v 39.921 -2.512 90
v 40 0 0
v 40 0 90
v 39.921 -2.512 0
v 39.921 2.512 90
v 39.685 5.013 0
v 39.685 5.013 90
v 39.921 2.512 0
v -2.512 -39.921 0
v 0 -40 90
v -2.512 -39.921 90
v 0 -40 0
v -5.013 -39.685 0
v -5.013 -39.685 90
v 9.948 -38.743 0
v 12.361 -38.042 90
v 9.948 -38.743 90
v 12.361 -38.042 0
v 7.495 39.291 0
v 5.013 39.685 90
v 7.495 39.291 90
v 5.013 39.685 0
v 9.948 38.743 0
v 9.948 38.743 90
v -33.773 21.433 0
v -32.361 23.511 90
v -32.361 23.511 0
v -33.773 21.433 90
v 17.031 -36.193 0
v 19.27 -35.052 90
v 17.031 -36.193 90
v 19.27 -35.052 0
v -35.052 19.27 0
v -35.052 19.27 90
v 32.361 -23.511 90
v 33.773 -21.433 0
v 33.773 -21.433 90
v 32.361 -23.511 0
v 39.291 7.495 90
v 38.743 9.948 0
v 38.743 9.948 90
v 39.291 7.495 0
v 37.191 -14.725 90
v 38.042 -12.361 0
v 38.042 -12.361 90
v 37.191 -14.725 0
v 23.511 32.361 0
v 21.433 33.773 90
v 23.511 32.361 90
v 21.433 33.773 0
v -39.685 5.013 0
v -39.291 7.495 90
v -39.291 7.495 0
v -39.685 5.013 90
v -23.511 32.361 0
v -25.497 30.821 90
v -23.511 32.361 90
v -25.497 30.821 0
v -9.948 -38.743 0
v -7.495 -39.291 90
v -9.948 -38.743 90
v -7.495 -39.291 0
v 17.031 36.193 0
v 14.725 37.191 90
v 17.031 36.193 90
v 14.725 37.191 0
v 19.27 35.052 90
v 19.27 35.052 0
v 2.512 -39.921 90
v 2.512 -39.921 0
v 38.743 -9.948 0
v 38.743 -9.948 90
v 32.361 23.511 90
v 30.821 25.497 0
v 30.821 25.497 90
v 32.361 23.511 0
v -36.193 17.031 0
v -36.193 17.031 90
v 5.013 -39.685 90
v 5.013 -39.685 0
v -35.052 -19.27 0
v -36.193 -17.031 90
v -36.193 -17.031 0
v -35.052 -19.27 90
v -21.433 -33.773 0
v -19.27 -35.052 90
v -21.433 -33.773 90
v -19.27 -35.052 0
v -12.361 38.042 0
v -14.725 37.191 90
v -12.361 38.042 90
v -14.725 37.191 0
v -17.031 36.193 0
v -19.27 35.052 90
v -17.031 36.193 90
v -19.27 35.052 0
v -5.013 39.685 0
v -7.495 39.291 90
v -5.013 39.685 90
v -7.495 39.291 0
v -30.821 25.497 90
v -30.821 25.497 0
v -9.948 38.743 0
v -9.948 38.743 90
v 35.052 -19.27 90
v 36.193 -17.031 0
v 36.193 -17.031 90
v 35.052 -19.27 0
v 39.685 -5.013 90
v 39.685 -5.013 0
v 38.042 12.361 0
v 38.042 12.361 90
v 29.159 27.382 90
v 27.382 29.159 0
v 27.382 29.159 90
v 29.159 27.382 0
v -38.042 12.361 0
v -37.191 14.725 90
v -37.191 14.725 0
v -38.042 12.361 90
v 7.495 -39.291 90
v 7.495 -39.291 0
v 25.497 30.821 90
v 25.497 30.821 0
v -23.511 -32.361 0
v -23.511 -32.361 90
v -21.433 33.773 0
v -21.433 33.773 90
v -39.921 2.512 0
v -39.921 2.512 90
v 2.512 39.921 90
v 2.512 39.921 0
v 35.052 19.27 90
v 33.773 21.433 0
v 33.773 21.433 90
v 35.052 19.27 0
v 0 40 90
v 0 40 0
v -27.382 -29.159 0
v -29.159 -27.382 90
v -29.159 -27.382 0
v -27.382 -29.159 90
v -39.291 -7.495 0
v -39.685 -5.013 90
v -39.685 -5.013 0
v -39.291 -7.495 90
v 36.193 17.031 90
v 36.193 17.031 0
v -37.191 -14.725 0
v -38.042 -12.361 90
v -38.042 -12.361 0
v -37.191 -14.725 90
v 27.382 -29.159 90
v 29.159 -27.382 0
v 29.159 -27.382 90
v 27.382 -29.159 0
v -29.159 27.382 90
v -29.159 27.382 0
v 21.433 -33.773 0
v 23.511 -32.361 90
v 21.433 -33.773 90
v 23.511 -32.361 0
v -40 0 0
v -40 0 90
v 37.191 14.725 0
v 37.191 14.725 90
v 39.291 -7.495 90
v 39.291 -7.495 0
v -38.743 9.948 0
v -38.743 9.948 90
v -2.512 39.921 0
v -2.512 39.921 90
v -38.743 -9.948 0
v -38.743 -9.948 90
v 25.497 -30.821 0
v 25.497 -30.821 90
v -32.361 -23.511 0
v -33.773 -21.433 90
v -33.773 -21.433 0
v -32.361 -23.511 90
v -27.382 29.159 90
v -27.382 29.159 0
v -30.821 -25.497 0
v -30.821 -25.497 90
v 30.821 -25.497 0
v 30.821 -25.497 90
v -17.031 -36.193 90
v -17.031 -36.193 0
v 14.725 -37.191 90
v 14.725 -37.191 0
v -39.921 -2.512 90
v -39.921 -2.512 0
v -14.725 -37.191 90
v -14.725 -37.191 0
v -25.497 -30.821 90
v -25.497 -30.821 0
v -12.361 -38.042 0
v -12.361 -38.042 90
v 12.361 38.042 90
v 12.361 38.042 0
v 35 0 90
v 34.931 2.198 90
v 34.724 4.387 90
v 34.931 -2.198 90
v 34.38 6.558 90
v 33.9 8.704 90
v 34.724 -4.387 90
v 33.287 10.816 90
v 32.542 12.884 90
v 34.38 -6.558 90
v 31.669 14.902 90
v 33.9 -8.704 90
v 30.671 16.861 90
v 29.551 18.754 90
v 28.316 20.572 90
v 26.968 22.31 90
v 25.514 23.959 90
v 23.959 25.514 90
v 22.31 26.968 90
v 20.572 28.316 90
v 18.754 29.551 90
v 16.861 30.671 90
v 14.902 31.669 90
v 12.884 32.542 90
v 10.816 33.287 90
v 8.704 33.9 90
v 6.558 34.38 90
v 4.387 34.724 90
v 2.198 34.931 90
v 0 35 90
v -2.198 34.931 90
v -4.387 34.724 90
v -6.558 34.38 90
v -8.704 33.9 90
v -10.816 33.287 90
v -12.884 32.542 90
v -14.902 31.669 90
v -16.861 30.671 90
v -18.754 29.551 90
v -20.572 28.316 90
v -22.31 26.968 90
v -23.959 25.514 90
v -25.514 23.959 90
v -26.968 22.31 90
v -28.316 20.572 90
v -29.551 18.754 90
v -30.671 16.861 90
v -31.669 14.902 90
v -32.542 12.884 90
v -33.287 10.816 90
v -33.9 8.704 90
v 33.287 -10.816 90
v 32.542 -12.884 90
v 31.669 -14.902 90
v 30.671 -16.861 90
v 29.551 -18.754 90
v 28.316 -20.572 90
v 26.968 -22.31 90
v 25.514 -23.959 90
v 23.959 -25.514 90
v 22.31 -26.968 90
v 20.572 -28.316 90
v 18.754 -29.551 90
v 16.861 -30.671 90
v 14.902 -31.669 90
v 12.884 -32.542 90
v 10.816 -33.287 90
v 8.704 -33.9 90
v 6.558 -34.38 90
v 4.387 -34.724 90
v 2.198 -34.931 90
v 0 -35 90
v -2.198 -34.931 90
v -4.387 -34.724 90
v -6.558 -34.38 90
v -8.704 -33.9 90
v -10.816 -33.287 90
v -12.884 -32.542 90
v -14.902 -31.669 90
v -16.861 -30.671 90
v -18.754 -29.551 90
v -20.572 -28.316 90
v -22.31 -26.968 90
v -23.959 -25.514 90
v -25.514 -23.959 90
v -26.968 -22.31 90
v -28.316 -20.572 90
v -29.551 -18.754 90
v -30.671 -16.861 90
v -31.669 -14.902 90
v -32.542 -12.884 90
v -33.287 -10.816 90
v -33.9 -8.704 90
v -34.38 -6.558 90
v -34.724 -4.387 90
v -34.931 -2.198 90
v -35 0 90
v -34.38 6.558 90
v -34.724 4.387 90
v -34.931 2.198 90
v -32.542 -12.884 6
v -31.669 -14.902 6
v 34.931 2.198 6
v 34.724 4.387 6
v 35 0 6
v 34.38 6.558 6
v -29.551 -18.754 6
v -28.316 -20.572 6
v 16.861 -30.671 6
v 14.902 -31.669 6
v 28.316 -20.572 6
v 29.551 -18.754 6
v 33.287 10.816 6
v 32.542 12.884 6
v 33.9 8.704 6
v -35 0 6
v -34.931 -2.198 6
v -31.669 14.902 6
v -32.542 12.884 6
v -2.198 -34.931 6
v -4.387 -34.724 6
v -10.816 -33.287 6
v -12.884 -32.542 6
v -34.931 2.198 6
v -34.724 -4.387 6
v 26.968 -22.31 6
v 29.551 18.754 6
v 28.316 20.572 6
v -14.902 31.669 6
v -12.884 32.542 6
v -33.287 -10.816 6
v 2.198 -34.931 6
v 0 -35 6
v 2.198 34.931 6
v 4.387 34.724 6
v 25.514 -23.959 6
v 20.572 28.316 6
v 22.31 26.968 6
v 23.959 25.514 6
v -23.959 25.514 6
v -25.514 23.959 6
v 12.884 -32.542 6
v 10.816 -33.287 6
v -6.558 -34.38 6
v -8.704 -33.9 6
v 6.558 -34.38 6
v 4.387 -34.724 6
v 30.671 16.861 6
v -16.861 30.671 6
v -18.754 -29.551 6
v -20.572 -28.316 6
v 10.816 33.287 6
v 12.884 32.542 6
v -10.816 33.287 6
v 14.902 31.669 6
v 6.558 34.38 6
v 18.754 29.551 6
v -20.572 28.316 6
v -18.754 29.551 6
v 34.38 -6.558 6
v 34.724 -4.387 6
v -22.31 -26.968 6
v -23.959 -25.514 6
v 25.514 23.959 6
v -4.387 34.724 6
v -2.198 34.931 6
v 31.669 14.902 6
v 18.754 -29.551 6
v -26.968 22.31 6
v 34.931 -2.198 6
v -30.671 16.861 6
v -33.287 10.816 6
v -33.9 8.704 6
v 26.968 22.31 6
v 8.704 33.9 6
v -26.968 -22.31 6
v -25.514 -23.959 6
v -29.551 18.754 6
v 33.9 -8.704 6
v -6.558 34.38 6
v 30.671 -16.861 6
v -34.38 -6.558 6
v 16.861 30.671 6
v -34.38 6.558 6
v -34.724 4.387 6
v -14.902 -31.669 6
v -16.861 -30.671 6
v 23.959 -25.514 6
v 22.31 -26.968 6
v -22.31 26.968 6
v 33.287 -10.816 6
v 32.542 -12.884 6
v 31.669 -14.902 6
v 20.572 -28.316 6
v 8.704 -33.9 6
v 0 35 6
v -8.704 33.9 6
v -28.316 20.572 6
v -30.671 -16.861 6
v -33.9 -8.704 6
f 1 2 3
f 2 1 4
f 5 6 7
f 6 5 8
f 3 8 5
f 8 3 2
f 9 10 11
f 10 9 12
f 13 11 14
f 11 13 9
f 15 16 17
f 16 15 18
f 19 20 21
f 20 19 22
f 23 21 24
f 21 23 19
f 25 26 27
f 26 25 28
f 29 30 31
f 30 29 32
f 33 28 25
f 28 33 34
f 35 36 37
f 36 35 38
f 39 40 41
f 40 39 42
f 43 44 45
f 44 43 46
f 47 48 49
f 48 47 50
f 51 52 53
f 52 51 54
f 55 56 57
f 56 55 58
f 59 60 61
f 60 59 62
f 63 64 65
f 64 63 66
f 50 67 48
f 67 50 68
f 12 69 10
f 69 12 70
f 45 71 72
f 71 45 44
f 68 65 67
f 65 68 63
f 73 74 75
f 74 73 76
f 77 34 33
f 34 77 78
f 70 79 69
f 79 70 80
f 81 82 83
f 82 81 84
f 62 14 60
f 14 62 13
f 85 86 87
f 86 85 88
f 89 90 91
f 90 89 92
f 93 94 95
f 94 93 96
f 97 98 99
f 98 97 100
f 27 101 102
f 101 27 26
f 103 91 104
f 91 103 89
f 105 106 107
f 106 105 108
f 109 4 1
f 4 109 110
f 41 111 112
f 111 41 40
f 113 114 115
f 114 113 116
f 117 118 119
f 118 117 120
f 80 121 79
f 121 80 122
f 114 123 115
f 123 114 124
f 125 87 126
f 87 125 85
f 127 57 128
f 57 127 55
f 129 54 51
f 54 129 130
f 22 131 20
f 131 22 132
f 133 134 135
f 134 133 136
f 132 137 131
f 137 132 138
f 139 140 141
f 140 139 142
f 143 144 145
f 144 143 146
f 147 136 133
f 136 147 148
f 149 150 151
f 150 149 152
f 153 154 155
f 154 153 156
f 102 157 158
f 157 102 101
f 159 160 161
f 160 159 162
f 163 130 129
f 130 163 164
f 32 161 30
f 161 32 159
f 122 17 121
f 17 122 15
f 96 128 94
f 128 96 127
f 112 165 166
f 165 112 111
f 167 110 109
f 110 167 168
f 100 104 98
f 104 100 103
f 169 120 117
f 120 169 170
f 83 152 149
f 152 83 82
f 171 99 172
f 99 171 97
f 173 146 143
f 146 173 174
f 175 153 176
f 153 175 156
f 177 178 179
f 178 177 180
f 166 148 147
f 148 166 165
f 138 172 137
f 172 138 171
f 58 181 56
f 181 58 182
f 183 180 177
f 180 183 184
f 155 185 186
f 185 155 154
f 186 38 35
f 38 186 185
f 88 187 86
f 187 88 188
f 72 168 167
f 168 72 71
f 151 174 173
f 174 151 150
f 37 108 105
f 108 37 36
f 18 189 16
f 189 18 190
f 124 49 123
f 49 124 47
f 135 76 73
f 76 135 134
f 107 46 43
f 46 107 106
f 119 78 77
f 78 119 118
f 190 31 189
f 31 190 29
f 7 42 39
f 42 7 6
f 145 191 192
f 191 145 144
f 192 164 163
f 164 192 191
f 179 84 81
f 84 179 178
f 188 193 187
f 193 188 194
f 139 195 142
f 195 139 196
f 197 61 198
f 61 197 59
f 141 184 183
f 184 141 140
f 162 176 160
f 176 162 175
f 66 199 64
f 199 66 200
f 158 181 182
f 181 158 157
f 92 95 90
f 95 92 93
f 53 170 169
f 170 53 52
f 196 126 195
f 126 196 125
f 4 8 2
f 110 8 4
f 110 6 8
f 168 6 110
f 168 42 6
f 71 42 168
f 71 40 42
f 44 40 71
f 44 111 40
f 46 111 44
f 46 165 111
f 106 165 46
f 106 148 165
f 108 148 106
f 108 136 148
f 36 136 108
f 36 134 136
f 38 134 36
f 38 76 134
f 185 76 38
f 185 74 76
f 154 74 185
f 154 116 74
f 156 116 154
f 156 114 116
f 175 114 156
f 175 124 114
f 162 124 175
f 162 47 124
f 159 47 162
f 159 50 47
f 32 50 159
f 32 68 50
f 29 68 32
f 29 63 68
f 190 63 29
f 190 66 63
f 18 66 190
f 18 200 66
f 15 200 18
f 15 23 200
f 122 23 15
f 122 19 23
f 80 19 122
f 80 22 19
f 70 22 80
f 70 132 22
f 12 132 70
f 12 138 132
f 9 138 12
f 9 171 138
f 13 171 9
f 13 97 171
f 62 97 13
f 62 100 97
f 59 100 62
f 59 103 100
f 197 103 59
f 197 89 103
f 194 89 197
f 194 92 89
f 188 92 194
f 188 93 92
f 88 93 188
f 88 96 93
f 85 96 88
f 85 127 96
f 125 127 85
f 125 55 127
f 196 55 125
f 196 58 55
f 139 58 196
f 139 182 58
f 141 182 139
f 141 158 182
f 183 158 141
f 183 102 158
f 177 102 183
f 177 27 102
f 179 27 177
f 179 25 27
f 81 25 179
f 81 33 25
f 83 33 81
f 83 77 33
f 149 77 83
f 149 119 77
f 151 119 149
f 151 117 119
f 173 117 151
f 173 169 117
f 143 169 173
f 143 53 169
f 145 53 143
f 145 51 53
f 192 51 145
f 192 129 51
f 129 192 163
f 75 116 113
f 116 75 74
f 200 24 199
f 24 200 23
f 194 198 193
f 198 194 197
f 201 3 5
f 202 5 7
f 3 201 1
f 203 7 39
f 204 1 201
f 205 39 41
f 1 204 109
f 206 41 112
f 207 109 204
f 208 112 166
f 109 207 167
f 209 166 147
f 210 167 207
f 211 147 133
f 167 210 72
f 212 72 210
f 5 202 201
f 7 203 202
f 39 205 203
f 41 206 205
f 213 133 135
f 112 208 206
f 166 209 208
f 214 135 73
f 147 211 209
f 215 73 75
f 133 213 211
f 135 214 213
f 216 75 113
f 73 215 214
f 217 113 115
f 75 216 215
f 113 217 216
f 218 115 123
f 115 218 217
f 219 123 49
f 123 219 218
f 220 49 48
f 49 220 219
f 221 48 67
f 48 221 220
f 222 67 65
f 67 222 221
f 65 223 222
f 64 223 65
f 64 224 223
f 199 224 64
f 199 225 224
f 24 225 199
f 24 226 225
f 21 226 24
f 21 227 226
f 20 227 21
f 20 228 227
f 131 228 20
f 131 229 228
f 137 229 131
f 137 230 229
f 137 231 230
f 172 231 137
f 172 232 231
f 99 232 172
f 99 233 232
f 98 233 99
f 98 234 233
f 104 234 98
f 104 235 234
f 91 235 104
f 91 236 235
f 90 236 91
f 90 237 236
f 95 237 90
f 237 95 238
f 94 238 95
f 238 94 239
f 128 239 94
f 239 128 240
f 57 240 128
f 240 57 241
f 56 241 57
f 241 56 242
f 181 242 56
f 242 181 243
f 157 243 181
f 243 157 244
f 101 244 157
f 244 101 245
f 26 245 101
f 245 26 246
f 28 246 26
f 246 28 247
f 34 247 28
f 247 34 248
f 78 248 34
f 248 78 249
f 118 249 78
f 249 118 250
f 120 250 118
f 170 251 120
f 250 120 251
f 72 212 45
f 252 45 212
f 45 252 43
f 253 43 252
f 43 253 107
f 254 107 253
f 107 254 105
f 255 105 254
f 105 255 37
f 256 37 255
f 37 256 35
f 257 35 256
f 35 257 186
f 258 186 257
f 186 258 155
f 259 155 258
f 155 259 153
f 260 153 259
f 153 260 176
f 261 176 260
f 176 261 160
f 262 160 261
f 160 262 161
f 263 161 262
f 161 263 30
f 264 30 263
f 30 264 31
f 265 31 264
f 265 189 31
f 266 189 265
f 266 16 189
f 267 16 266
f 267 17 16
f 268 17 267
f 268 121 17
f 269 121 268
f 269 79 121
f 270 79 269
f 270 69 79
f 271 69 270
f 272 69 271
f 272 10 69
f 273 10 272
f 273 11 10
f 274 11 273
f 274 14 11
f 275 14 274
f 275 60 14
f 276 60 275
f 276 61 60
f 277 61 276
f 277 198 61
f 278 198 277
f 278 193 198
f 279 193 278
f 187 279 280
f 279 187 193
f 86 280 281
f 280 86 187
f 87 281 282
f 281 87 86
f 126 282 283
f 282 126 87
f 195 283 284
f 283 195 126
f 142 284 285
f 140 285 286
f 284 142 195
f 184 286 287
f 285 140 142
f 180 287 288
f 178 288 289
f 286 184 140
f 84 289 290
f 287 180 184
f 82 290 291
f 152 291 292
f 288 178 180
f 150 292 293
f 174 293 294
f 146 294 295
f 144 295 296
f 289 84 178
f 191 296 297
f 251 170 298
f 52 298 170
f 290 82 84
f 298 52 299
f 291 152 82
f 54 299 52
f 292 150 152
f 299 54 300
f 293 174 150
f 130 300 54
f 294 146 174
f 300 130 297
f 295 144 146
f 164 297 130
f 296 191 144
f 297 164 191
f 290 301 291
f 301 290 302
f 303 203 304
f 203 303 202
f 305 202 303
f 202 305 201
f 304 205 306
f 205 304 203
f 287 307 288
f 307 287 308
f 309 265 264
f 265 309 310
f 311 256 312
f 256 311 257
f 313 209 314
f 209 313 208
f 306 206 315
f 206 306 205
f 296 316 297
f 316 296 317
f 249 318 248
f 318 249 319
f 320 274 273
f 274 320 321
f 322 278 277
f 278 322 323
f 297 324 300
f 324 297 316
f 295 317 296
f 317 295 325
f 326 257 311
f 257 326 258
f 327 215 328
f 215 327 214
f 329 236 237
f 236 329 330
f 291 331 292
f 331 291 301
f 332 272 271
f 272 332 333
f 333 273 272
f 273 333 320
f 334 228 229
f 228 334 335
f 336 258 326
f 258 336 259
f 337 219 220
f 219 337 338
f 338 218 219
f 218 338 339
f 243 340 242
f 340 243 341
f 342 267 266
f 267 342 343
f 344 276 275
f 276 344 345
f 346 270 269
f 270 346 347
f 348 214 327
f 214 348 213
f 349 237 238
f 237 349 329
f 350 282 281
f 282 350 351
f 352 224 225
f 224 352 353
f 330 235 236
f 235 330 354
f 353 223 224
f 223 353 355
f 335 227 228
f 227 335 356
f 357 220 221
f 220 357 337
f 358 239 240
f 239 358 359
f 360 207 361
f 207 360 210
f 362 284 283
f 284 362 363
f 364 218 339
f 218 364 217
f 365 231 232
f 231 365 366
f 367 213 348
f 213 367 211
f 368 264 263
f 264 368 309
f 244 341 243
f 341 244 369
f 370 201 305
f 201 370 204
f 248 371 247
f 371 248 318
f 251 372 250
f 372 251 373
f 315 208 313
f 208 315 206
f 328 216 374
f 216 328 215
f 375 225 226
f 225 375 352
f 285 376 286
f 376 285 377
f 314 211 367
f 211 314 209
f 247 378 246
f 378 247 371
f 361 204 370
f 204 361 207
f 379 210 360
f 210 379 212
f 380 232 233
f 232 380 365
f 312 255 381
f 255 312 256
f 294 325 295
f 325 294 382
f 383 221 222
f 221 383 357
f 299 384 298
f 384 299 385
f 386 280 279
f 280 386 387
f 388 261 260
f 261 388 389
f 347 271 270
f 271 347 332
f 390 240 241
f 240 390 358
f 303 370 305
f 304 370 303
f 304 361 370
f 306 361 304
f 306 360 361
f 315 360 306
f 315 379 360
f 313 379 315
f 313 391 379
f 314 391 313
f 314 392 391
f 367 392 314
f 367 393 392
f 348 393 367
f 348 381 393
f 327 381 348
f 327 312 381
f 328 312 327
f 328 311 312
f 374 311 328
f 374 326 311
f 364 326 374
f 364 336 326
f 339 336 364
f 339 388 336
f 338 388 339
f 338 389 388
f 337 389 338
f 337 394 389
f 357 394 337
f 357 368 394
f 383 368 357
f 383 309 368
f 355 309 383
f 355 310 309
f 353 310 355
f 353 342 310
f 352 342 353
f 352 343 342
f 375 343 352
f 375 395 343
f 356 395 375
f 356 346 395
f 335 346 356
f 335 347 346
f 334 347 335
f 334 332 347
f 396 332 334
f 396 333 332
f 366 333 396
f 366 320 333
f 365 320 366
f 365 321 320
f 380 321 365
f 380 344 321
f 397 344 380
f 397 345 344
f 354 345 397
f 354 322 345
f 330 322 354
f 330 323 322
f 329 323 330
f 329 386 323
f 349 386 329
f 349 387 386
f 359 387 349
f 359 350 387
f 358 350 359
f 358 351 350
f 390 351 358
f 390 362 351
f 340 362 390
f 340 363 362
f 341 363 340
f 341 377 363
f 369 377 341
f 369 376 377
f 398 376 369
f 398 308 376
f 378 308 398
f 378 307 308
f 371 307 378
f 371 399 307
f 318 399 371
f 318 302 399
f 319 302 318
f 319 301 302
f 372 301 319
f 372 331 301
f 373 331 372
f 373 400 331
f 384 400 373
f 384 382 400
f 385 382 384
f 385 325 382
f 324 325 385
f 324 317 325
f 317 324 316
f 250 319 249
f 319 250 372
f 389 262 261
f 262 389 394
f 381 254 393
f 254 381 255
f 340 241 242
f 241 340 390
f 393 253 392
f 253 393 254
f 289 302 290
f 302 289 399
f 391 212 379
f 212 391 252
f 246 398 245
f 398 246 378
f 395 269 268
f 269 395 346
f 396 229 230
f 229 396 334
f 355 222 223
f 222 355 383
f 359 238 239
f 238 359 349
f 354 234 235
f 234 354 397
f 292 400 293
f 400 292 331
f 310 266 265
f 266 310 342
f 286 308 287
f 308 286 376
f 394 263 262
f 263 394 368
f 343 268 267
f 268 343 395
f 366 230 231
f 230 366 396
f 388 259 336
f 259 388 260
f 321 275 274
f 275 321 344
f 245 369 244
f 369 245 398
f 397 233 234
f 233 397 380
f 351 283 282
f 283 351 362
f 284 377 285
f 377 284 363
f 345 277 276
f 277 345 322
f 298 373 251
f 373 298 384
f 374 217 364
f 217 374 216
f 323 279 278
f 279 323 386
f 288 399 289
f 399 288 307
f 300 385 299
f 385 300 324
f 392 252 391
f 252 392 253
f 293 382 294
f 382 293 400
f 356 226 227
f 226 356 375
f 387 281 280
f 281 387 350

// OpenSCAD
// マグカップ

$fn = 100;

// 本体パラメータ
outer_d = 80;
inner_d = 70;
height = 90;
bottom_thickness = 6;

// 取手パラメータ
handle_inner_h = 30;   // 取手内側の高さ(Z方向)
handle_inner_w = 25;   // 取手内側の幅(本体からの突き出し方向 = X)
handle_thickness = 8;  // 取手の太さ(Y方向の厚み)

module mug_body() {
    difference() {
        cylinder(d = outer_d, h = height);
        translate([0, 0, bottom_thickness])
            cylinder(d = inner_d, h = height - bottom_thickness + 0.01);
    }
}

module handle() {
    // XZ 平面に D 字形状を 2D で描き、Y 方向に linear_extrude して厚みを付ける。
    // 描画後、X-Z 平面の 2D を扱うため、いったん XY で描いて rotate([90,0,0]) で立てる。
    
    handle_outer_h = handle_inner_h + 2 * handle_thickness; // Z 方向の総高さ
    handle_outer_w = handle_inner_w + handle_thickness;     // X 方向の総幅(本体面から外へ)
    
    z_center = height / 2;
    // 本体外周に少し食い込ませて確実に union
    x_base = outer_d/2 - 1;
    
    translate([x_base, 0, z_center])
        rotate([90, 0, 0])  // XY平面で描いた図形のY軸→Z軸に立てる
            translate([0, 0, -handle_thickness/2])
                linear_extrude(height = handle_thickness)
                    difference() {
                        // 外形 D 字: 左端(本体側)は直線、右側は半円
                        hull() {
                            // 本体側の直線部(Y軸方向に伸びる細長い長方形)
                            translate([0, 0])
                                square([0.1, handle_outer_h], center = true);
                            // 外側の半円
                            translate([handle_outer_w - handle_outer_h/2, 0])
                                circle(d = handle_outer_h);
                        }
                        // 内側の穴 (D字の内側)
                        hull() {
                            translate([handle_thickness, 0])
                                square([0.1, handle_inner_h], center = true);
                            translate([handle_thickness + handle_inner_w - handle_inner_h/2, 0])
                                circle(d = handle_inner_h);
                        }
                    }
}

union() {
    mug_body();
    handle();
}
